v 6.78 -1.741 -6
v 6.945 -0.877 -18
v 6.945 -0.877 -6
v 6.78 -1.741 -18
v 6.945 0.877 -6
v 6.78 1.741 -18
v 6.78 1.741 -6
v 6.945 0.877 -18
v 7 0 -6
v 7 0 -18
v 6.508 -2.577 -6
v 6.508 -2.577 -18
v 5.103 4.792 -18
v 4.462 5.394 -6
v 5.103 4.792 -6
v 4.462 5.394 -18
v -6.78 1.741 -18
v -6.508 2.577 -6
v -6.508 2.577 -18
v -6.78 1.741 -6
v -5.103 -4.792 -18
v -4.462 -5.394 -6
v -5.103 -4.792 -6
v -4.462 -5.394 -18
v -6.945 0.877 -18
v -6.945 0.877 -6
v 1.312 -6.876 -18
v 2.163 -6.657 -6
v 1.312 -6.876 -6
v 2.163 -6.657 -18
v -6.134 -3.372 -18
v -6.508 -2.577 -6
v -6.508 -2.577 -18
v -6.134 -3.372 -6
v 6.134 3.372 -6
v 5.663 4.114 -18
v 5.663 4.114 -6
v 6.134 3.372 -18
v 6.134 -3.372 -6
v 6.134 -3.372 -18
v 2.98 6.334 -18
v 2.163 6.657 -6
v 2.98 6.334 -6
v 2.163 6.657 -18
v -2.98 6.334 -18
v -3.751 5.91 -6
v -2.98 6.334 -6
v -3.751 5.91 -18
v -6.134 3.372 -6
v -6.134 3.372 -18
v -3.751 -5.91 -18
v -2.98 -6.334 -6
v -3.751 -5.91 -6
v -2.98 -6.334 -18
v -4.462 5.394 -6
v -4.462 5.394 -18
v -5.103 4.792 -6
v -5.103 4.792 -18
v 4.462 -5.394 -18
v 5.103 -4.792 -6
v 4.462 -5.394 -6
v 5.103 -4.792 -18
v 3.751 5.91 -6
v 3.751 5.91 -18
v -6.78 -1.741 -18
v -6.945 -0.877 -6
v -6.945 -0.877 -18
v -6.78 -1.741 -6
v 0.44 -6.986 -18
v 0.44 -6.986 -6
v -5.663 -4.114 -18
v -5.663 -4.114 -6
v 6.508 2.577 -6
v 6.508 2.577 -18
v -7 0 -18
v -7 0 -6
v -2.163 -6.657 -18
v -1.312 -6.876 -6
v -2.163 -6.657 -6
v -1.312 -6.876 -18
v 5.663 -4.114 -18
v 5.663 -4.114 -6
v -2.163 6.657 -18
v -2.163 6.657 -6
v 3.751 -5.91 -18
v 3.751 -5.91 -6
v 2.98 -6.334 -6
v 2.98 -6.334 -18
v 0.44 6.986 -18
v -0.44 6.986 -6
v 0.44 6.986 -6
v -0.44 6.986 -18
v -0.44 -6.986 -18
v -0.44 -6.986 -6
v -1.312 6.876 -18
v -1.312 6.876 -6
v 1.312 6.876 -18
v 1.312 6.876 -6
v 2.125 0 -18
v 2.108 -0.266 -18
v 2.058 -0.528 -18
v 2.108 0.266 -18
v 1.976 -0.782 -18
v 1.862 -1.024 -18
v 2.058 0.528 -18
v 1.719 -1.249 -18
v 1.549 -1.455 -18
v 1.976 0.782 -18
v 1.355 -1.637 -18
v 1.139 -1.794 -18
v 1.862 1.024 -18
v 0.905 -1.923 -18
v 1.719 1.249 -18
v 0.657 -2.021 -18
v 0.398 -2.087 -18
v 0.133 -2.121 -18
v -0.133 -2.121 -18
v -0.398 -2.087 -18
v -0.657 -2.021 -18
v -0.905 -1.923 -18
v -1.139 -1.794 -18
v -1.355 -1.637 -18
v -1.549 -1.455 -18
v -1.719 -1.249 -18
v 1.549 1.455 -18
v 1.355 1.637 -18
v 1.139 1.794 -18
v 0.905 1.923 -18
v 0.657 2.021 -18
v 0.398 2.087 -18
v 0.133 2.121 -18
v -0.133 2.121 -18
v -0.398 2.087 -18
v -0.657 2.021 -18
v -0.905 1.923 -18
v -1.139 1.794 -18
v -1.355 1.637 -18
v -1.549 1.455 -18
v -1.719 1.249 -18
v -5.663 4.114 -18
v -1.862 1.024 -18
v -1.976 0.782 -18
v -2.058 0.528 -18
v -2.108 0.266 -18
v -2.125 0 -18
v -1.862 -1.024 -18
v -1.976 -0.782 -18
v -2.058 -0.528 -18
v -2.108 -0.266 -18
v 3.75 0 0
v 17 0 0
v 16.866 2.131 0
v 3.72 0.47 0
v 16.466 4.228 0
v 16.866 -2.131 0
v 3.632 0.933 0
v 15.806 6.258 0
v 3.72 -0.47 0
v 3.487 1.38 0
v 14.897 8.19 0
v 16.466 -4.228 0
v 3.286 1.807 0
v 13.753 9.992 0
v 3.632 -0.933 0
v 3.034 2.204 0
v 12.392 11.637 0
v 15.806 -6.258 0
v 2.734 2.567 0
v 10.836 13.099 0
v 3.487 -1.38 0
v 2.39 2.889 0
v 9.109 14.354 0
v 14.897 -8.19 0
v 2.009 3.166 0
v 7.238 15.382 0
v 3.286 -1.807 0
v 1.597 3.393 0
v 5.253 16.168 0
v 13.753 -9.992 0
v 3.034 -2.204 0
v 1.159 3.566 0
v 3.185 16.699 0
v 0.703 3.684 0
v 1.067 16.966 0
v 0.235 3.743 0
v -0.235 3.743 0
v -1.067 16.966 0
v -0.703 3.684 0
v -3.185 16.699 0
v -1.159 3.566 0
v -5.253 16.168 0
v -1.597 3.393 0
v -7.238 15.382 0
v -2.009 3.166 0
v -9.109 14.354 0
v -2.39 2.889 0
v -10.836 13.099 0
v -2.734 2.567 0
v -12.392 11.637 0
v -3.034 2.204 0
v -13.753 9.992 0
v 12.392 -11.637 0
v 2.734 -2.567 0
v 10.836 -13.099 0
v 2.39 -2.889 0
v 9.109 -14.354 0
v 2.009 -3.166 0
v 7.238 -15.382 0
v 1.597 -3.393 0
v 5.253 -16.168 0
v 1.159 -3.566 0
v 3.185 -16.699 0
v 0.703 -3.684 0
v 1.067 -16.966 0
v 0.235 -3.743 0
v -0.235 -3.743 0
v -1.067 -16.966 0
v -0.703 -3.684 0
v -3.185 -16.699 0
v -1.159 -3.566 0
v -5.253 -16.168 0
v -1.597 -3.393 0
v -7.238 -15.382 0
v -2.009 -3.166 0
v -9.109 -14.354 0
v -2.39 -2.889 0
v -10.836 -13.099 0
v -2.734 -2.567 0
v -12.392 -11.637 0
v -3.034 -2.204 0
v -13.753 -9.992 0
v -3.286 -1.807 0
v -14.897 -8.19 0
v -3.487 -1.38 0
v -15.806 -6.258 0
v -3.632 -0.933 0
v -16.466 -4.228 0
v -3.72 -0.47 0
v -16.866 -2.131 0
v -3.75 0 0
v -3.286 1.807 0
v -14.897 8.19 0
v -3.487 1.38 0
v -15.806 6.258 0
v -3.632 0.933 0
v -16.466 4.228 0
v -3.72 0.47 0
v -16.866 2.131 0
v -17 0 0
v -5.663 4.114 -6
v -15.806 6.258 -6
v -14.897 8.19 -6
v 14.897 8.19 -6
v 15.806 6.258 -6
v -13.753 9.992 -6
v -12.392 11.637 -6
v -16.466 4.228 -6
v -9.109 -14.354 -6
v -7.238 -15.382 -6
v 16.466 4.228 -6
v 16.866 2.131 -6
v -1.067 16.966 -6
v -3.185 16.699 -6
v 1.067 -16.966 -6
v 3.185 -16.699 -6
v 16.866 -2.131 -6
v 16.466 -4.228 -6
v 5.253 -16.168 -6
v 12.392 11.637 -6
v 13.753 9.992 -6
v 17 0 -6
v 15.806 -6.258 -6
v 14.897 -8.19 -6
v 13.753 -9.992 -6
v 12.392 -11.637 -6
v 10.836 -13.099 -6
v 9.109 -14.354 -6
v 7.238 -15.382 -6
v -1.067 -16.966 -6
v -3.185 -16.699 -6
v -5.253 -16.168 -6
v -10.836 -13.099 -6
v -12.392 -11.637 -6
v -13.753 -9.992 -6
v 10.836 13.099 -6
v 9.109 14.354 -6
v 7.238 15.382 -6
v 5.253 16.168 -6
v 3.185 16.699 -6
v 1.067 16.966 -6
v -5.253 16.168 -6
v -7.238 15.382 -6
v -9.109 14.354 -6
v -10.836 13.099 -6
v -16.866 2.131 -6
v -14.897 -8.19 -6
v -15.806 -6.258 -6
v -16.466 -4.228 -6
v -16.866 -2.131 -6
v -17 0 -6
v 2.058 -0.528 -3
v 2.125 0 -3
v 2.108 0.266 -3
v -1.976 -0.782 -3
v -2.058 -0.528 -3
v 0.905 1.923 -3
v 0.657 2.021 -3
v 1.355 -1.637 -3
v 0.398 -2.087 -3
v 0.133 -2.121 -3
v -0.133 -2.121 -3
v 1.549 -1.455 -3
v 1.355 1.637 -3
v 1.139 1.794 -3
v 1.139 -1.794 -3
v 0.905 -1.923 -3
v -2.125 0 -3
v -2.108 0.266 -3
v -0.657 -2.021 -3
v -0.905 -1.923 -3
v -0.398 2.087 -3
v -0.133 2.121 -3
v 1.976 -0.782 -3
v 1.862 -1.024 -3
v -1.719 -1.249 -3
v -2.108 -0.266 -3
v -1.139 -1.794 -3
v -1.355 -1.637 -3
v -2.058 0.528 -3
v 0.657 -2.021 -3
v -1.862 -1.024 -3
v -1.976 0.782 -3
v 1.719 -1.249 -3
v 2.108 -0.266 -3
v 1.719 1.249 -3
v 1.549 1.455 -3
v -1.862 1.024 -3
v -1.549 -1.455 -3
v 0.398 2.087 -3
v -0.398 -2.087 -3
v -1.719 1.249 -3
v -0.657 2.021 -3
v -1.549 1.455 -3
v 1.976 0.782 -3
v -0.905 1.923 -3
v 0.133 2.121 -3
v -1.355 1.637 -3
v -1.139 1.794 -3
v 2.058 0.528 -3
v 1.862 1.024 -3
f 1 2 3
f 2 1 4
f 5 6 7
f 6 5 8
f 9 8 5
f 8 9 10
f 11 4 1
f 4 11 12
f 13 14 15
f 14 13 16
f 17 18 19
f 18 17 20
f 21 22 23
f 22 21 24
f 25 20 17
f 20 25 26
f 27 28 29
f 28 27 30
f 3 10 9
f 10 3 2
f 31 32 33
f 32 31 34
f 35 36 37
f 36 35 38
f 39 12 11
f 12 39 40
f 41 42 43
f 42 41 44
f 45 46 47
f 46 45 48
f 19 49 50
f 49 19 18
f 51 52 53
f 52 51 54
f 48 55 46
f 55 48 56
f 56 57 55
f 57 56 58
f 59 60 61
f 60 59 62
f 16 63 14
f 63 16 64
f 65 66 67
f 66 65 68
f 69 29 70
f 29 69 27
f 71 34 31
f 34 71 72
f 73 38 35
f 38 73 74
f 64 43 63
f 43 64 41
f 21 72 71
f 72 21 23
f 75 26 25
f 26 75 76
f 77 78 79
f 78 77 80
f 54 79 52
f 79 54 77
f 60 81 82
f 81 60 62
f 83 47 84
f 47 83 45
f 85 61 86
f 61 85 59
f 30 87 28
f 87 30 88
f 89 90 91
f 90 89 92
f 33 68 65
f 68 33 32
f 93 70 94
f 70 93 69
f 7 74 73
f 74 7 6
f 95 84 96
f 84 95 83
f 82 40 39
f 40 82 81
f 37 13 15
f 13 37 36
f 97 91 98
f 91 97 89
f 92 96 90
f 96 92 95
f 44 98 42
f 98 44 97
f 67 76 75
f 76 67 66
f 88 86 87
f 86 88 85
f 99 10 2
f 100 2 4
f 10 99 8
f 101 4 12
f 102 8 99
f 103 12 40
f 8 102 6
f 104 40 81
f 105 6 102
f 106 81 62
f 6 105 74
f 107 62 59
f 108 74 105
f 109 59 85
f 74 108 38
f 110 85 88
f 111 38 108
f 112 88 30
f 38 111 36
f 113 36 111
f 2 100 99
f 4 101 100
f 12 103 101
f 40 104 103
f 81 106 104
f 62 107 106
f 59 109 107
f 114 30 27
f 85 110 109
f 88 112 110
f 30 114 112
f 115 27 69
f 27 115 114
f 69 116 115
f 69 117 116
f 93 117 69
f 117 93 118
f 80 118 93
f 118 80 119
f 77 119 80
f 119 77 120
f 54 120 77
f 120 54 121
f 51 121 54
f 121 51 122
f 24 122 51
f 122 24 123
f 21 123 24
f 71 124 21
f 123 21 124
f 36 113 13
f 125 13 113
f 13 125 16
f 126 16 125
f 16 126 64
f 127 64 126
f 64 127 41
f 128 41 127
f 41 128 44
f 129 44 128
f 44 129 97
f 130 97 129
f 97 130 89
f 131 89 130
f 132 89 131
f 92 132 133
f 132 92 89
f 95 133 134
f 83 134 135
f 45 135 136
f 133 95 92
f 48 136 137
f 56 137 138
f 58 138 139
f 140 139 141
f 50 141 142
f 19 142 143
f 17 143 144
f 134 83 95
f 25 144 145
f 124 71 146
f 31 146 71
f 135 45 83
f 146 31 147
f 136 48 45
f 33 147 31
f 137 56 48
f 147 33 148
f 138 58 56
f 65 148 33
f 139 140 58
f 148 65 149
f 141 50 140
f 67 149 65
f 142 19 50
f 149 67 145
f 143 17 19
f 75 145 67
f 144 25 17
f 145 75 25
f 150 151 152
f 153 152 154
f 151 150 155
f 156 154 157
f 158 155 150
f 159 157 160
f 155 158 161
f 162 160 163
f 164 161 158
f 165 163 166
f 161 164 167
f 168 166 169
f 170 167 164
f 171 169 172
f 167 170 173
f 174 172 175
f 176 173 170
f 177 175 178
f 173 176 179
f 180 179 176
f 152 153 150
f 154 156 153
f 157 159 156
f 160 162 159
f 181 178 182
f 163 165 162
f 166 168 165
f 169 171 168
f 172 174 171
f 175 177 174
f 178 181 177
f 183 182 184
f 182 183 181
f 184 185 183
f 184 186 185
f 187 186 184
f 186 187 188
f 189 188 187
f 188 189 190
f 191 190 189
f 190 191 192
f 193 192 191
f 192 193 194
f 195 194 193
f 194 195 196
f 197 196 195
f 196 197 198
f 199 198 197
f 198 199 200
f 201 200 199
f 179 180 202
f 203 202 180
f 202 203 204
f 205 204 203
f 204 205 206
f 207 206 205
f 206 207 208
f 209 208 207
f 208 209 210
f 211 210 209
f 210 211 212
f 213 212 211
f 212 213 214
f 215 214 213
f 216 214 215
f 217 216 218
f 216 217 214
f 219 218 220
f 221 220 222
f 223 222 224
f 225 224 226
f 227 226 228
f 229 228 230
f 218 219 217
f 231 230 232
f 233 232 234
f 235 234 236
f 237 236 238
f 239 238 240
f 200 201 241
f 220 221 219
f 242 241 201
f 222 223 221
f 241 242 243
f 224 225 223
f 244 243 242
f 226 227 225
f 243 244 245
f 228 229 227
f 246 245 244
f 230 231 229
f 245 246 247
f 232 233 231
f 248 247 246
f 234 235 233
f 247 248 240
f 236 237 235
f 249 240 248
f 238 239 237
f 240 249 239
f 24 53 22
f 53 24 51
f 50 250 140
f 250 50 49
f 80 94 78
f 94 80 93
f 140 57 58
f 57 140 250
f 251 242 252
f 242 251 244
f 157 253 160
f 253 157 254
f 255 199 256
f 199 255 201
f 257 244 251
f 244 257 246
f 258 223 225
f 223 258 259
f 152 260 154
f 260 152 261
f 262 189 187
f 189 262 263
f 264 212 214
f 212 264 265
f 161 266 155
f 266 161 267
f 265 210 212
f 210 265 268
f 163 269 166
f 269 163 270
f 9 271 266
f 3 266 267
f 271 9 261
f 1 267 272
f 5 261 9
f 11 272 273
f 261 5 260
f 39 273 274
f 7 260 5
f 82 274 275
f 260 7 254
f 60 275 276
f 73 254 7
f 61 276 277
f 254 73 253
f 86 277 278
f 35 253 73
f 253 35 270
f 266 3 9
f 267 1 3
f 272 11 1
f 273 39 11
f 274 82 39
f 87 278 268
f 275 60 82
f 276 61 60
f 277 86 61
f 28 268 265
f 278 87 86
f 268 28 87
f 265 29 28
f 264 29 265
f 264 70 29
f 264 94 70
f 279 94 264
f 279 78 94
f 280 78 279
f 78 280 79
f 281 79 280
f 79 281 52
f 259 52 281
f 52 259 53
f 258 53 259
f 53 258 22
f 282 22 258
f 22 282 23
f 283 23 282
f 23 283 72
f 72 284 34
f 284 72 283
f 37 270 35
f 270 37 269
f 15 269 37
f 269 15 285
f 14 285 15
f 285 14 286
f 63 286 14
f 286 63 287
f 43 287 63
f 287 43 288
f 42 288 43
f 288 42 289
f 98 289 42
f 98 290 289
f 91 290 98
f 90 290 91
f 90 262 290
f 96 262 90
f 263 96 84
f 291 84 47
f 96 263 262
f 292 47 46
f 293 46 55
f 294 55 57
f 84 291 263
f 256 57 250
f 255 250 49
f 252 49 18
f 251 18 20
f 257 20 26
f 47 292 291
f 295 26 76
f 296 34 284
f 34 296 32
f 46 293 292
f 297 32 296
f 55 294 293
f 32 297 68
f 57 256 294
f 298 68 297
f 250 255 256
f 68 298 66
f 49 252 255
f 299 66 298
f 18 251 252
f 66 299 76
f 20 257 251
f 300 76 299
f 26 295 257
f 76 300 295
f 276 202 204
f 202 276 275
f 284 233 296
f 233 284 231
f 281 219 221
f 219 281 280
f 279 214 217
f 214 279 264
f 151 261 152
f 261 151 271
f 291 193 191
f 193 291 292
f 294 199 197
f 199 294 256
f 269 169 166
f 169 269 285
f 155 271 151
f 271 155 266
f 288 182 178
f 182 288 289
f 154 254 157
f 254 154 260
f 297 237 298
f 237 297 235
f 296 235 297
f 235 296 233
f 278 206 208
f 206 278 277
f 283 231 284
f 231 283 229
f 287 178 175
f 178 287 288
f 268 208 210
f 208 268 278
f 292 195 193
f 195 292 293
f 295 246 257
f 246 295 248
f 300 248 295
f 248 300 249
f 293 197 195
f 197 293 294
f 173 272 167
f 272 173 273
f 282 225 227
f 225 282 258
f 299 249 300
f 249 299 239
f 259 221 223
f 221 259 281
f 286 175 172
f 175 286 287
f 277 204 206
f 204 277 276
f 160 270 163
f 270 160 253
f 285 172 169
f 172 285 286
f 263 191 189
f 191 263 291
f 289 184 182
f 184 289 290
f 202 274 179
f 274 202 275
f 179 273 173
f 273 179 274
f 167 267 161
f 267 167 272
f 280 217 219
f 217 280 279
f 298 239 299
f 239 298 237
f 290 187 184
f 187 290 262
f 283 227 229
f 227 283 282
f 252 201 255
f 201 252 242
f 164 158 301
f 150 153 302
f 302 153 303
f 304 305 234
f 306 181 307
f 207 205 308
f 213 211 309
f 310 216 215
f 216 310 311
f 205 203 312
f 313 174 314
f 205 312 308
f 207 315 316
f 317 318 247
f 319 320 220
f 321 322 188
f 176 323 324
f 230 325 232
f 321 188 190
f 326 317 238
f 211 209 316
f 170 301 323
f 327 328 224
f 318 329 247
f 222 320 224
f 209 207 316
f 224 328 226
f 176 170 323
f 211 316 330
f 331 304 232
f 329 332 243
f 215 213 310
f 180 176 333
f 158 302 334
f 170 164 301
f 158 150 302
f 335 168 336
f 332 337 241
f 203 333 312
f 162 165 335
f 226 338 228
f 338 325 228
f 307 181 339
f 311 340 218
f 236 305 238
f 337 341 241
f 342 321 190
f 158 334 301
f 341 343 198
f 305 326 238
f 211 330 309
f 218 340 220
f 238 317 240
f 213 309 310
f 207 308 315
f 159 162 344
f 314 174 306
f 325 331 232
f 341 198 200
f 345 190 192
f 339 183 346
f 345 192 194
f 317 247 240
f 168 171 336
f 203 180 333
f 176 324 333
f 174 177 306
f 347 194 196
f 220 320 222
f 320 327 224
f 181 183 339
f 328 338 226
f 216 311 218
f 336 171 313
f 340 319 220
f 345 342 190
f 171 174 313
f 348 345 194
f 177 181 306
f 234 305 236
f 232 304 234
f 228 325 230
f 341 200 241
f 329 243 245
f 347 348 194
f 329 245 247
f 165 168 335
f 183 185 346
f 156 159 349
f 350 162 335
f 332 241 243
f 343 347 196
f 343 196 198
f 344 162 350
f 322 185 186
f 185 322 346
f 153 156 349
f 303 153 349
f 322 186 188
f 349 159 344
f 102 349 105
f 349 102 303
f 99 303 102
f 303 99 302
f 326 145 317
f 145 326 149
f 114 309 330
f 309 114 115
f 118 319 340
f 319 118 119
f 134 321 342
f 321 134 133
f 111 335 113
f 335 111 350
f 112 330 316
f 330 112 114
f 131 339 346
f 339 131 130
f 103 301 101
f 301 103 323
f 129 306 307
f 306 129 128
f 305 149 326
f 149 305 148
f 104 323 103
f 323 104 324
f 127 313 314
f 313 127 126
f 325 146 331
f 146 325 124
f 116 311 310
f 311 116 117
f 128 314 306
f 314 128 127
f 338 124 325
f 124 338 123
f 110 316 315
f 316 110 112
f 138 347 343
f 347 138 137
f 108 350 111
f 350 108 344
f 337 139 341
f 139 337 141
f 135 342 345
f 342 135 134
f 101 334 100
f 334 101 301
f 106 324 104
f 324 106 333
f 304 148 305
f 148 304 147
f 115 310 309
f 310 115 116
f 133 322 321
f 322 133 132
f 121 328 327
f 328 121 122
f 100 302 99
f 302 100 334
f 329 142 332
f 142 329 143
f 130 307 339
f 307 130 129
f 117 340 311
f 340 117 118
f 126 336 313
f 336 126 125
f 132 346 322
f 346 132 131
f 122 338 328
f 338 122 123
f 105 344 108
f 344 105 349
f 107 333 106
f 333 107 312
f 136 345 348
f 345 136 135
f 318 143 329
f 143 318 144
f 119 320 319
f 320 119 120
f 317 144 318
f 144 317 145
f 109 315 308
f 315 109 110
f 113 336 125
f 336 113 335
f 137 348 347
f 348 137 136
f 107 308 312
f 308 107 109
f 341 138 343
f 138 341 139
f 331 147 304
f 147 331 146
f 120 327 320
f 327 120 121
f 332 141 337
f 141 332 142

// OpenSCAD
$fn = 50;


difference() {
	union() {
		translate(v = [0, 0, -18.0000000000]) {
			cylinder(h = 18, r = 7.0000000000);
		}
		translate(v = [0, 0, -6.0000000000]) {
			cylinder(h = 6, r = 17.0000000000);
		}
	}
	union() {
		translate(v = [0, 0, 0]) {
			rotate(a = [0, 0, 0]) {
				difference() {
					union() {
						#translate(v = [0, 0, -18.0000000000]) {
							cylinder(h = 18, r = 2.0000000000);
						}
						#translate(v = [0, 0, -3]) {
							cylinder(h = 3, r = 7.0000000000, r1 = 2.1250000000, r2 = 3.7500000000);
						}
						#translate(v = [0, 0, -18.0000000000]) {
							cylinder(h = 18, r = 2.1250000000);
						}
						#translate(v = [0, 0, -18.0000000000]) {
							cylinder(h = 18, r = 2.0000000000);
						}
					}
					union();
				}
			}
		}
	}
}
